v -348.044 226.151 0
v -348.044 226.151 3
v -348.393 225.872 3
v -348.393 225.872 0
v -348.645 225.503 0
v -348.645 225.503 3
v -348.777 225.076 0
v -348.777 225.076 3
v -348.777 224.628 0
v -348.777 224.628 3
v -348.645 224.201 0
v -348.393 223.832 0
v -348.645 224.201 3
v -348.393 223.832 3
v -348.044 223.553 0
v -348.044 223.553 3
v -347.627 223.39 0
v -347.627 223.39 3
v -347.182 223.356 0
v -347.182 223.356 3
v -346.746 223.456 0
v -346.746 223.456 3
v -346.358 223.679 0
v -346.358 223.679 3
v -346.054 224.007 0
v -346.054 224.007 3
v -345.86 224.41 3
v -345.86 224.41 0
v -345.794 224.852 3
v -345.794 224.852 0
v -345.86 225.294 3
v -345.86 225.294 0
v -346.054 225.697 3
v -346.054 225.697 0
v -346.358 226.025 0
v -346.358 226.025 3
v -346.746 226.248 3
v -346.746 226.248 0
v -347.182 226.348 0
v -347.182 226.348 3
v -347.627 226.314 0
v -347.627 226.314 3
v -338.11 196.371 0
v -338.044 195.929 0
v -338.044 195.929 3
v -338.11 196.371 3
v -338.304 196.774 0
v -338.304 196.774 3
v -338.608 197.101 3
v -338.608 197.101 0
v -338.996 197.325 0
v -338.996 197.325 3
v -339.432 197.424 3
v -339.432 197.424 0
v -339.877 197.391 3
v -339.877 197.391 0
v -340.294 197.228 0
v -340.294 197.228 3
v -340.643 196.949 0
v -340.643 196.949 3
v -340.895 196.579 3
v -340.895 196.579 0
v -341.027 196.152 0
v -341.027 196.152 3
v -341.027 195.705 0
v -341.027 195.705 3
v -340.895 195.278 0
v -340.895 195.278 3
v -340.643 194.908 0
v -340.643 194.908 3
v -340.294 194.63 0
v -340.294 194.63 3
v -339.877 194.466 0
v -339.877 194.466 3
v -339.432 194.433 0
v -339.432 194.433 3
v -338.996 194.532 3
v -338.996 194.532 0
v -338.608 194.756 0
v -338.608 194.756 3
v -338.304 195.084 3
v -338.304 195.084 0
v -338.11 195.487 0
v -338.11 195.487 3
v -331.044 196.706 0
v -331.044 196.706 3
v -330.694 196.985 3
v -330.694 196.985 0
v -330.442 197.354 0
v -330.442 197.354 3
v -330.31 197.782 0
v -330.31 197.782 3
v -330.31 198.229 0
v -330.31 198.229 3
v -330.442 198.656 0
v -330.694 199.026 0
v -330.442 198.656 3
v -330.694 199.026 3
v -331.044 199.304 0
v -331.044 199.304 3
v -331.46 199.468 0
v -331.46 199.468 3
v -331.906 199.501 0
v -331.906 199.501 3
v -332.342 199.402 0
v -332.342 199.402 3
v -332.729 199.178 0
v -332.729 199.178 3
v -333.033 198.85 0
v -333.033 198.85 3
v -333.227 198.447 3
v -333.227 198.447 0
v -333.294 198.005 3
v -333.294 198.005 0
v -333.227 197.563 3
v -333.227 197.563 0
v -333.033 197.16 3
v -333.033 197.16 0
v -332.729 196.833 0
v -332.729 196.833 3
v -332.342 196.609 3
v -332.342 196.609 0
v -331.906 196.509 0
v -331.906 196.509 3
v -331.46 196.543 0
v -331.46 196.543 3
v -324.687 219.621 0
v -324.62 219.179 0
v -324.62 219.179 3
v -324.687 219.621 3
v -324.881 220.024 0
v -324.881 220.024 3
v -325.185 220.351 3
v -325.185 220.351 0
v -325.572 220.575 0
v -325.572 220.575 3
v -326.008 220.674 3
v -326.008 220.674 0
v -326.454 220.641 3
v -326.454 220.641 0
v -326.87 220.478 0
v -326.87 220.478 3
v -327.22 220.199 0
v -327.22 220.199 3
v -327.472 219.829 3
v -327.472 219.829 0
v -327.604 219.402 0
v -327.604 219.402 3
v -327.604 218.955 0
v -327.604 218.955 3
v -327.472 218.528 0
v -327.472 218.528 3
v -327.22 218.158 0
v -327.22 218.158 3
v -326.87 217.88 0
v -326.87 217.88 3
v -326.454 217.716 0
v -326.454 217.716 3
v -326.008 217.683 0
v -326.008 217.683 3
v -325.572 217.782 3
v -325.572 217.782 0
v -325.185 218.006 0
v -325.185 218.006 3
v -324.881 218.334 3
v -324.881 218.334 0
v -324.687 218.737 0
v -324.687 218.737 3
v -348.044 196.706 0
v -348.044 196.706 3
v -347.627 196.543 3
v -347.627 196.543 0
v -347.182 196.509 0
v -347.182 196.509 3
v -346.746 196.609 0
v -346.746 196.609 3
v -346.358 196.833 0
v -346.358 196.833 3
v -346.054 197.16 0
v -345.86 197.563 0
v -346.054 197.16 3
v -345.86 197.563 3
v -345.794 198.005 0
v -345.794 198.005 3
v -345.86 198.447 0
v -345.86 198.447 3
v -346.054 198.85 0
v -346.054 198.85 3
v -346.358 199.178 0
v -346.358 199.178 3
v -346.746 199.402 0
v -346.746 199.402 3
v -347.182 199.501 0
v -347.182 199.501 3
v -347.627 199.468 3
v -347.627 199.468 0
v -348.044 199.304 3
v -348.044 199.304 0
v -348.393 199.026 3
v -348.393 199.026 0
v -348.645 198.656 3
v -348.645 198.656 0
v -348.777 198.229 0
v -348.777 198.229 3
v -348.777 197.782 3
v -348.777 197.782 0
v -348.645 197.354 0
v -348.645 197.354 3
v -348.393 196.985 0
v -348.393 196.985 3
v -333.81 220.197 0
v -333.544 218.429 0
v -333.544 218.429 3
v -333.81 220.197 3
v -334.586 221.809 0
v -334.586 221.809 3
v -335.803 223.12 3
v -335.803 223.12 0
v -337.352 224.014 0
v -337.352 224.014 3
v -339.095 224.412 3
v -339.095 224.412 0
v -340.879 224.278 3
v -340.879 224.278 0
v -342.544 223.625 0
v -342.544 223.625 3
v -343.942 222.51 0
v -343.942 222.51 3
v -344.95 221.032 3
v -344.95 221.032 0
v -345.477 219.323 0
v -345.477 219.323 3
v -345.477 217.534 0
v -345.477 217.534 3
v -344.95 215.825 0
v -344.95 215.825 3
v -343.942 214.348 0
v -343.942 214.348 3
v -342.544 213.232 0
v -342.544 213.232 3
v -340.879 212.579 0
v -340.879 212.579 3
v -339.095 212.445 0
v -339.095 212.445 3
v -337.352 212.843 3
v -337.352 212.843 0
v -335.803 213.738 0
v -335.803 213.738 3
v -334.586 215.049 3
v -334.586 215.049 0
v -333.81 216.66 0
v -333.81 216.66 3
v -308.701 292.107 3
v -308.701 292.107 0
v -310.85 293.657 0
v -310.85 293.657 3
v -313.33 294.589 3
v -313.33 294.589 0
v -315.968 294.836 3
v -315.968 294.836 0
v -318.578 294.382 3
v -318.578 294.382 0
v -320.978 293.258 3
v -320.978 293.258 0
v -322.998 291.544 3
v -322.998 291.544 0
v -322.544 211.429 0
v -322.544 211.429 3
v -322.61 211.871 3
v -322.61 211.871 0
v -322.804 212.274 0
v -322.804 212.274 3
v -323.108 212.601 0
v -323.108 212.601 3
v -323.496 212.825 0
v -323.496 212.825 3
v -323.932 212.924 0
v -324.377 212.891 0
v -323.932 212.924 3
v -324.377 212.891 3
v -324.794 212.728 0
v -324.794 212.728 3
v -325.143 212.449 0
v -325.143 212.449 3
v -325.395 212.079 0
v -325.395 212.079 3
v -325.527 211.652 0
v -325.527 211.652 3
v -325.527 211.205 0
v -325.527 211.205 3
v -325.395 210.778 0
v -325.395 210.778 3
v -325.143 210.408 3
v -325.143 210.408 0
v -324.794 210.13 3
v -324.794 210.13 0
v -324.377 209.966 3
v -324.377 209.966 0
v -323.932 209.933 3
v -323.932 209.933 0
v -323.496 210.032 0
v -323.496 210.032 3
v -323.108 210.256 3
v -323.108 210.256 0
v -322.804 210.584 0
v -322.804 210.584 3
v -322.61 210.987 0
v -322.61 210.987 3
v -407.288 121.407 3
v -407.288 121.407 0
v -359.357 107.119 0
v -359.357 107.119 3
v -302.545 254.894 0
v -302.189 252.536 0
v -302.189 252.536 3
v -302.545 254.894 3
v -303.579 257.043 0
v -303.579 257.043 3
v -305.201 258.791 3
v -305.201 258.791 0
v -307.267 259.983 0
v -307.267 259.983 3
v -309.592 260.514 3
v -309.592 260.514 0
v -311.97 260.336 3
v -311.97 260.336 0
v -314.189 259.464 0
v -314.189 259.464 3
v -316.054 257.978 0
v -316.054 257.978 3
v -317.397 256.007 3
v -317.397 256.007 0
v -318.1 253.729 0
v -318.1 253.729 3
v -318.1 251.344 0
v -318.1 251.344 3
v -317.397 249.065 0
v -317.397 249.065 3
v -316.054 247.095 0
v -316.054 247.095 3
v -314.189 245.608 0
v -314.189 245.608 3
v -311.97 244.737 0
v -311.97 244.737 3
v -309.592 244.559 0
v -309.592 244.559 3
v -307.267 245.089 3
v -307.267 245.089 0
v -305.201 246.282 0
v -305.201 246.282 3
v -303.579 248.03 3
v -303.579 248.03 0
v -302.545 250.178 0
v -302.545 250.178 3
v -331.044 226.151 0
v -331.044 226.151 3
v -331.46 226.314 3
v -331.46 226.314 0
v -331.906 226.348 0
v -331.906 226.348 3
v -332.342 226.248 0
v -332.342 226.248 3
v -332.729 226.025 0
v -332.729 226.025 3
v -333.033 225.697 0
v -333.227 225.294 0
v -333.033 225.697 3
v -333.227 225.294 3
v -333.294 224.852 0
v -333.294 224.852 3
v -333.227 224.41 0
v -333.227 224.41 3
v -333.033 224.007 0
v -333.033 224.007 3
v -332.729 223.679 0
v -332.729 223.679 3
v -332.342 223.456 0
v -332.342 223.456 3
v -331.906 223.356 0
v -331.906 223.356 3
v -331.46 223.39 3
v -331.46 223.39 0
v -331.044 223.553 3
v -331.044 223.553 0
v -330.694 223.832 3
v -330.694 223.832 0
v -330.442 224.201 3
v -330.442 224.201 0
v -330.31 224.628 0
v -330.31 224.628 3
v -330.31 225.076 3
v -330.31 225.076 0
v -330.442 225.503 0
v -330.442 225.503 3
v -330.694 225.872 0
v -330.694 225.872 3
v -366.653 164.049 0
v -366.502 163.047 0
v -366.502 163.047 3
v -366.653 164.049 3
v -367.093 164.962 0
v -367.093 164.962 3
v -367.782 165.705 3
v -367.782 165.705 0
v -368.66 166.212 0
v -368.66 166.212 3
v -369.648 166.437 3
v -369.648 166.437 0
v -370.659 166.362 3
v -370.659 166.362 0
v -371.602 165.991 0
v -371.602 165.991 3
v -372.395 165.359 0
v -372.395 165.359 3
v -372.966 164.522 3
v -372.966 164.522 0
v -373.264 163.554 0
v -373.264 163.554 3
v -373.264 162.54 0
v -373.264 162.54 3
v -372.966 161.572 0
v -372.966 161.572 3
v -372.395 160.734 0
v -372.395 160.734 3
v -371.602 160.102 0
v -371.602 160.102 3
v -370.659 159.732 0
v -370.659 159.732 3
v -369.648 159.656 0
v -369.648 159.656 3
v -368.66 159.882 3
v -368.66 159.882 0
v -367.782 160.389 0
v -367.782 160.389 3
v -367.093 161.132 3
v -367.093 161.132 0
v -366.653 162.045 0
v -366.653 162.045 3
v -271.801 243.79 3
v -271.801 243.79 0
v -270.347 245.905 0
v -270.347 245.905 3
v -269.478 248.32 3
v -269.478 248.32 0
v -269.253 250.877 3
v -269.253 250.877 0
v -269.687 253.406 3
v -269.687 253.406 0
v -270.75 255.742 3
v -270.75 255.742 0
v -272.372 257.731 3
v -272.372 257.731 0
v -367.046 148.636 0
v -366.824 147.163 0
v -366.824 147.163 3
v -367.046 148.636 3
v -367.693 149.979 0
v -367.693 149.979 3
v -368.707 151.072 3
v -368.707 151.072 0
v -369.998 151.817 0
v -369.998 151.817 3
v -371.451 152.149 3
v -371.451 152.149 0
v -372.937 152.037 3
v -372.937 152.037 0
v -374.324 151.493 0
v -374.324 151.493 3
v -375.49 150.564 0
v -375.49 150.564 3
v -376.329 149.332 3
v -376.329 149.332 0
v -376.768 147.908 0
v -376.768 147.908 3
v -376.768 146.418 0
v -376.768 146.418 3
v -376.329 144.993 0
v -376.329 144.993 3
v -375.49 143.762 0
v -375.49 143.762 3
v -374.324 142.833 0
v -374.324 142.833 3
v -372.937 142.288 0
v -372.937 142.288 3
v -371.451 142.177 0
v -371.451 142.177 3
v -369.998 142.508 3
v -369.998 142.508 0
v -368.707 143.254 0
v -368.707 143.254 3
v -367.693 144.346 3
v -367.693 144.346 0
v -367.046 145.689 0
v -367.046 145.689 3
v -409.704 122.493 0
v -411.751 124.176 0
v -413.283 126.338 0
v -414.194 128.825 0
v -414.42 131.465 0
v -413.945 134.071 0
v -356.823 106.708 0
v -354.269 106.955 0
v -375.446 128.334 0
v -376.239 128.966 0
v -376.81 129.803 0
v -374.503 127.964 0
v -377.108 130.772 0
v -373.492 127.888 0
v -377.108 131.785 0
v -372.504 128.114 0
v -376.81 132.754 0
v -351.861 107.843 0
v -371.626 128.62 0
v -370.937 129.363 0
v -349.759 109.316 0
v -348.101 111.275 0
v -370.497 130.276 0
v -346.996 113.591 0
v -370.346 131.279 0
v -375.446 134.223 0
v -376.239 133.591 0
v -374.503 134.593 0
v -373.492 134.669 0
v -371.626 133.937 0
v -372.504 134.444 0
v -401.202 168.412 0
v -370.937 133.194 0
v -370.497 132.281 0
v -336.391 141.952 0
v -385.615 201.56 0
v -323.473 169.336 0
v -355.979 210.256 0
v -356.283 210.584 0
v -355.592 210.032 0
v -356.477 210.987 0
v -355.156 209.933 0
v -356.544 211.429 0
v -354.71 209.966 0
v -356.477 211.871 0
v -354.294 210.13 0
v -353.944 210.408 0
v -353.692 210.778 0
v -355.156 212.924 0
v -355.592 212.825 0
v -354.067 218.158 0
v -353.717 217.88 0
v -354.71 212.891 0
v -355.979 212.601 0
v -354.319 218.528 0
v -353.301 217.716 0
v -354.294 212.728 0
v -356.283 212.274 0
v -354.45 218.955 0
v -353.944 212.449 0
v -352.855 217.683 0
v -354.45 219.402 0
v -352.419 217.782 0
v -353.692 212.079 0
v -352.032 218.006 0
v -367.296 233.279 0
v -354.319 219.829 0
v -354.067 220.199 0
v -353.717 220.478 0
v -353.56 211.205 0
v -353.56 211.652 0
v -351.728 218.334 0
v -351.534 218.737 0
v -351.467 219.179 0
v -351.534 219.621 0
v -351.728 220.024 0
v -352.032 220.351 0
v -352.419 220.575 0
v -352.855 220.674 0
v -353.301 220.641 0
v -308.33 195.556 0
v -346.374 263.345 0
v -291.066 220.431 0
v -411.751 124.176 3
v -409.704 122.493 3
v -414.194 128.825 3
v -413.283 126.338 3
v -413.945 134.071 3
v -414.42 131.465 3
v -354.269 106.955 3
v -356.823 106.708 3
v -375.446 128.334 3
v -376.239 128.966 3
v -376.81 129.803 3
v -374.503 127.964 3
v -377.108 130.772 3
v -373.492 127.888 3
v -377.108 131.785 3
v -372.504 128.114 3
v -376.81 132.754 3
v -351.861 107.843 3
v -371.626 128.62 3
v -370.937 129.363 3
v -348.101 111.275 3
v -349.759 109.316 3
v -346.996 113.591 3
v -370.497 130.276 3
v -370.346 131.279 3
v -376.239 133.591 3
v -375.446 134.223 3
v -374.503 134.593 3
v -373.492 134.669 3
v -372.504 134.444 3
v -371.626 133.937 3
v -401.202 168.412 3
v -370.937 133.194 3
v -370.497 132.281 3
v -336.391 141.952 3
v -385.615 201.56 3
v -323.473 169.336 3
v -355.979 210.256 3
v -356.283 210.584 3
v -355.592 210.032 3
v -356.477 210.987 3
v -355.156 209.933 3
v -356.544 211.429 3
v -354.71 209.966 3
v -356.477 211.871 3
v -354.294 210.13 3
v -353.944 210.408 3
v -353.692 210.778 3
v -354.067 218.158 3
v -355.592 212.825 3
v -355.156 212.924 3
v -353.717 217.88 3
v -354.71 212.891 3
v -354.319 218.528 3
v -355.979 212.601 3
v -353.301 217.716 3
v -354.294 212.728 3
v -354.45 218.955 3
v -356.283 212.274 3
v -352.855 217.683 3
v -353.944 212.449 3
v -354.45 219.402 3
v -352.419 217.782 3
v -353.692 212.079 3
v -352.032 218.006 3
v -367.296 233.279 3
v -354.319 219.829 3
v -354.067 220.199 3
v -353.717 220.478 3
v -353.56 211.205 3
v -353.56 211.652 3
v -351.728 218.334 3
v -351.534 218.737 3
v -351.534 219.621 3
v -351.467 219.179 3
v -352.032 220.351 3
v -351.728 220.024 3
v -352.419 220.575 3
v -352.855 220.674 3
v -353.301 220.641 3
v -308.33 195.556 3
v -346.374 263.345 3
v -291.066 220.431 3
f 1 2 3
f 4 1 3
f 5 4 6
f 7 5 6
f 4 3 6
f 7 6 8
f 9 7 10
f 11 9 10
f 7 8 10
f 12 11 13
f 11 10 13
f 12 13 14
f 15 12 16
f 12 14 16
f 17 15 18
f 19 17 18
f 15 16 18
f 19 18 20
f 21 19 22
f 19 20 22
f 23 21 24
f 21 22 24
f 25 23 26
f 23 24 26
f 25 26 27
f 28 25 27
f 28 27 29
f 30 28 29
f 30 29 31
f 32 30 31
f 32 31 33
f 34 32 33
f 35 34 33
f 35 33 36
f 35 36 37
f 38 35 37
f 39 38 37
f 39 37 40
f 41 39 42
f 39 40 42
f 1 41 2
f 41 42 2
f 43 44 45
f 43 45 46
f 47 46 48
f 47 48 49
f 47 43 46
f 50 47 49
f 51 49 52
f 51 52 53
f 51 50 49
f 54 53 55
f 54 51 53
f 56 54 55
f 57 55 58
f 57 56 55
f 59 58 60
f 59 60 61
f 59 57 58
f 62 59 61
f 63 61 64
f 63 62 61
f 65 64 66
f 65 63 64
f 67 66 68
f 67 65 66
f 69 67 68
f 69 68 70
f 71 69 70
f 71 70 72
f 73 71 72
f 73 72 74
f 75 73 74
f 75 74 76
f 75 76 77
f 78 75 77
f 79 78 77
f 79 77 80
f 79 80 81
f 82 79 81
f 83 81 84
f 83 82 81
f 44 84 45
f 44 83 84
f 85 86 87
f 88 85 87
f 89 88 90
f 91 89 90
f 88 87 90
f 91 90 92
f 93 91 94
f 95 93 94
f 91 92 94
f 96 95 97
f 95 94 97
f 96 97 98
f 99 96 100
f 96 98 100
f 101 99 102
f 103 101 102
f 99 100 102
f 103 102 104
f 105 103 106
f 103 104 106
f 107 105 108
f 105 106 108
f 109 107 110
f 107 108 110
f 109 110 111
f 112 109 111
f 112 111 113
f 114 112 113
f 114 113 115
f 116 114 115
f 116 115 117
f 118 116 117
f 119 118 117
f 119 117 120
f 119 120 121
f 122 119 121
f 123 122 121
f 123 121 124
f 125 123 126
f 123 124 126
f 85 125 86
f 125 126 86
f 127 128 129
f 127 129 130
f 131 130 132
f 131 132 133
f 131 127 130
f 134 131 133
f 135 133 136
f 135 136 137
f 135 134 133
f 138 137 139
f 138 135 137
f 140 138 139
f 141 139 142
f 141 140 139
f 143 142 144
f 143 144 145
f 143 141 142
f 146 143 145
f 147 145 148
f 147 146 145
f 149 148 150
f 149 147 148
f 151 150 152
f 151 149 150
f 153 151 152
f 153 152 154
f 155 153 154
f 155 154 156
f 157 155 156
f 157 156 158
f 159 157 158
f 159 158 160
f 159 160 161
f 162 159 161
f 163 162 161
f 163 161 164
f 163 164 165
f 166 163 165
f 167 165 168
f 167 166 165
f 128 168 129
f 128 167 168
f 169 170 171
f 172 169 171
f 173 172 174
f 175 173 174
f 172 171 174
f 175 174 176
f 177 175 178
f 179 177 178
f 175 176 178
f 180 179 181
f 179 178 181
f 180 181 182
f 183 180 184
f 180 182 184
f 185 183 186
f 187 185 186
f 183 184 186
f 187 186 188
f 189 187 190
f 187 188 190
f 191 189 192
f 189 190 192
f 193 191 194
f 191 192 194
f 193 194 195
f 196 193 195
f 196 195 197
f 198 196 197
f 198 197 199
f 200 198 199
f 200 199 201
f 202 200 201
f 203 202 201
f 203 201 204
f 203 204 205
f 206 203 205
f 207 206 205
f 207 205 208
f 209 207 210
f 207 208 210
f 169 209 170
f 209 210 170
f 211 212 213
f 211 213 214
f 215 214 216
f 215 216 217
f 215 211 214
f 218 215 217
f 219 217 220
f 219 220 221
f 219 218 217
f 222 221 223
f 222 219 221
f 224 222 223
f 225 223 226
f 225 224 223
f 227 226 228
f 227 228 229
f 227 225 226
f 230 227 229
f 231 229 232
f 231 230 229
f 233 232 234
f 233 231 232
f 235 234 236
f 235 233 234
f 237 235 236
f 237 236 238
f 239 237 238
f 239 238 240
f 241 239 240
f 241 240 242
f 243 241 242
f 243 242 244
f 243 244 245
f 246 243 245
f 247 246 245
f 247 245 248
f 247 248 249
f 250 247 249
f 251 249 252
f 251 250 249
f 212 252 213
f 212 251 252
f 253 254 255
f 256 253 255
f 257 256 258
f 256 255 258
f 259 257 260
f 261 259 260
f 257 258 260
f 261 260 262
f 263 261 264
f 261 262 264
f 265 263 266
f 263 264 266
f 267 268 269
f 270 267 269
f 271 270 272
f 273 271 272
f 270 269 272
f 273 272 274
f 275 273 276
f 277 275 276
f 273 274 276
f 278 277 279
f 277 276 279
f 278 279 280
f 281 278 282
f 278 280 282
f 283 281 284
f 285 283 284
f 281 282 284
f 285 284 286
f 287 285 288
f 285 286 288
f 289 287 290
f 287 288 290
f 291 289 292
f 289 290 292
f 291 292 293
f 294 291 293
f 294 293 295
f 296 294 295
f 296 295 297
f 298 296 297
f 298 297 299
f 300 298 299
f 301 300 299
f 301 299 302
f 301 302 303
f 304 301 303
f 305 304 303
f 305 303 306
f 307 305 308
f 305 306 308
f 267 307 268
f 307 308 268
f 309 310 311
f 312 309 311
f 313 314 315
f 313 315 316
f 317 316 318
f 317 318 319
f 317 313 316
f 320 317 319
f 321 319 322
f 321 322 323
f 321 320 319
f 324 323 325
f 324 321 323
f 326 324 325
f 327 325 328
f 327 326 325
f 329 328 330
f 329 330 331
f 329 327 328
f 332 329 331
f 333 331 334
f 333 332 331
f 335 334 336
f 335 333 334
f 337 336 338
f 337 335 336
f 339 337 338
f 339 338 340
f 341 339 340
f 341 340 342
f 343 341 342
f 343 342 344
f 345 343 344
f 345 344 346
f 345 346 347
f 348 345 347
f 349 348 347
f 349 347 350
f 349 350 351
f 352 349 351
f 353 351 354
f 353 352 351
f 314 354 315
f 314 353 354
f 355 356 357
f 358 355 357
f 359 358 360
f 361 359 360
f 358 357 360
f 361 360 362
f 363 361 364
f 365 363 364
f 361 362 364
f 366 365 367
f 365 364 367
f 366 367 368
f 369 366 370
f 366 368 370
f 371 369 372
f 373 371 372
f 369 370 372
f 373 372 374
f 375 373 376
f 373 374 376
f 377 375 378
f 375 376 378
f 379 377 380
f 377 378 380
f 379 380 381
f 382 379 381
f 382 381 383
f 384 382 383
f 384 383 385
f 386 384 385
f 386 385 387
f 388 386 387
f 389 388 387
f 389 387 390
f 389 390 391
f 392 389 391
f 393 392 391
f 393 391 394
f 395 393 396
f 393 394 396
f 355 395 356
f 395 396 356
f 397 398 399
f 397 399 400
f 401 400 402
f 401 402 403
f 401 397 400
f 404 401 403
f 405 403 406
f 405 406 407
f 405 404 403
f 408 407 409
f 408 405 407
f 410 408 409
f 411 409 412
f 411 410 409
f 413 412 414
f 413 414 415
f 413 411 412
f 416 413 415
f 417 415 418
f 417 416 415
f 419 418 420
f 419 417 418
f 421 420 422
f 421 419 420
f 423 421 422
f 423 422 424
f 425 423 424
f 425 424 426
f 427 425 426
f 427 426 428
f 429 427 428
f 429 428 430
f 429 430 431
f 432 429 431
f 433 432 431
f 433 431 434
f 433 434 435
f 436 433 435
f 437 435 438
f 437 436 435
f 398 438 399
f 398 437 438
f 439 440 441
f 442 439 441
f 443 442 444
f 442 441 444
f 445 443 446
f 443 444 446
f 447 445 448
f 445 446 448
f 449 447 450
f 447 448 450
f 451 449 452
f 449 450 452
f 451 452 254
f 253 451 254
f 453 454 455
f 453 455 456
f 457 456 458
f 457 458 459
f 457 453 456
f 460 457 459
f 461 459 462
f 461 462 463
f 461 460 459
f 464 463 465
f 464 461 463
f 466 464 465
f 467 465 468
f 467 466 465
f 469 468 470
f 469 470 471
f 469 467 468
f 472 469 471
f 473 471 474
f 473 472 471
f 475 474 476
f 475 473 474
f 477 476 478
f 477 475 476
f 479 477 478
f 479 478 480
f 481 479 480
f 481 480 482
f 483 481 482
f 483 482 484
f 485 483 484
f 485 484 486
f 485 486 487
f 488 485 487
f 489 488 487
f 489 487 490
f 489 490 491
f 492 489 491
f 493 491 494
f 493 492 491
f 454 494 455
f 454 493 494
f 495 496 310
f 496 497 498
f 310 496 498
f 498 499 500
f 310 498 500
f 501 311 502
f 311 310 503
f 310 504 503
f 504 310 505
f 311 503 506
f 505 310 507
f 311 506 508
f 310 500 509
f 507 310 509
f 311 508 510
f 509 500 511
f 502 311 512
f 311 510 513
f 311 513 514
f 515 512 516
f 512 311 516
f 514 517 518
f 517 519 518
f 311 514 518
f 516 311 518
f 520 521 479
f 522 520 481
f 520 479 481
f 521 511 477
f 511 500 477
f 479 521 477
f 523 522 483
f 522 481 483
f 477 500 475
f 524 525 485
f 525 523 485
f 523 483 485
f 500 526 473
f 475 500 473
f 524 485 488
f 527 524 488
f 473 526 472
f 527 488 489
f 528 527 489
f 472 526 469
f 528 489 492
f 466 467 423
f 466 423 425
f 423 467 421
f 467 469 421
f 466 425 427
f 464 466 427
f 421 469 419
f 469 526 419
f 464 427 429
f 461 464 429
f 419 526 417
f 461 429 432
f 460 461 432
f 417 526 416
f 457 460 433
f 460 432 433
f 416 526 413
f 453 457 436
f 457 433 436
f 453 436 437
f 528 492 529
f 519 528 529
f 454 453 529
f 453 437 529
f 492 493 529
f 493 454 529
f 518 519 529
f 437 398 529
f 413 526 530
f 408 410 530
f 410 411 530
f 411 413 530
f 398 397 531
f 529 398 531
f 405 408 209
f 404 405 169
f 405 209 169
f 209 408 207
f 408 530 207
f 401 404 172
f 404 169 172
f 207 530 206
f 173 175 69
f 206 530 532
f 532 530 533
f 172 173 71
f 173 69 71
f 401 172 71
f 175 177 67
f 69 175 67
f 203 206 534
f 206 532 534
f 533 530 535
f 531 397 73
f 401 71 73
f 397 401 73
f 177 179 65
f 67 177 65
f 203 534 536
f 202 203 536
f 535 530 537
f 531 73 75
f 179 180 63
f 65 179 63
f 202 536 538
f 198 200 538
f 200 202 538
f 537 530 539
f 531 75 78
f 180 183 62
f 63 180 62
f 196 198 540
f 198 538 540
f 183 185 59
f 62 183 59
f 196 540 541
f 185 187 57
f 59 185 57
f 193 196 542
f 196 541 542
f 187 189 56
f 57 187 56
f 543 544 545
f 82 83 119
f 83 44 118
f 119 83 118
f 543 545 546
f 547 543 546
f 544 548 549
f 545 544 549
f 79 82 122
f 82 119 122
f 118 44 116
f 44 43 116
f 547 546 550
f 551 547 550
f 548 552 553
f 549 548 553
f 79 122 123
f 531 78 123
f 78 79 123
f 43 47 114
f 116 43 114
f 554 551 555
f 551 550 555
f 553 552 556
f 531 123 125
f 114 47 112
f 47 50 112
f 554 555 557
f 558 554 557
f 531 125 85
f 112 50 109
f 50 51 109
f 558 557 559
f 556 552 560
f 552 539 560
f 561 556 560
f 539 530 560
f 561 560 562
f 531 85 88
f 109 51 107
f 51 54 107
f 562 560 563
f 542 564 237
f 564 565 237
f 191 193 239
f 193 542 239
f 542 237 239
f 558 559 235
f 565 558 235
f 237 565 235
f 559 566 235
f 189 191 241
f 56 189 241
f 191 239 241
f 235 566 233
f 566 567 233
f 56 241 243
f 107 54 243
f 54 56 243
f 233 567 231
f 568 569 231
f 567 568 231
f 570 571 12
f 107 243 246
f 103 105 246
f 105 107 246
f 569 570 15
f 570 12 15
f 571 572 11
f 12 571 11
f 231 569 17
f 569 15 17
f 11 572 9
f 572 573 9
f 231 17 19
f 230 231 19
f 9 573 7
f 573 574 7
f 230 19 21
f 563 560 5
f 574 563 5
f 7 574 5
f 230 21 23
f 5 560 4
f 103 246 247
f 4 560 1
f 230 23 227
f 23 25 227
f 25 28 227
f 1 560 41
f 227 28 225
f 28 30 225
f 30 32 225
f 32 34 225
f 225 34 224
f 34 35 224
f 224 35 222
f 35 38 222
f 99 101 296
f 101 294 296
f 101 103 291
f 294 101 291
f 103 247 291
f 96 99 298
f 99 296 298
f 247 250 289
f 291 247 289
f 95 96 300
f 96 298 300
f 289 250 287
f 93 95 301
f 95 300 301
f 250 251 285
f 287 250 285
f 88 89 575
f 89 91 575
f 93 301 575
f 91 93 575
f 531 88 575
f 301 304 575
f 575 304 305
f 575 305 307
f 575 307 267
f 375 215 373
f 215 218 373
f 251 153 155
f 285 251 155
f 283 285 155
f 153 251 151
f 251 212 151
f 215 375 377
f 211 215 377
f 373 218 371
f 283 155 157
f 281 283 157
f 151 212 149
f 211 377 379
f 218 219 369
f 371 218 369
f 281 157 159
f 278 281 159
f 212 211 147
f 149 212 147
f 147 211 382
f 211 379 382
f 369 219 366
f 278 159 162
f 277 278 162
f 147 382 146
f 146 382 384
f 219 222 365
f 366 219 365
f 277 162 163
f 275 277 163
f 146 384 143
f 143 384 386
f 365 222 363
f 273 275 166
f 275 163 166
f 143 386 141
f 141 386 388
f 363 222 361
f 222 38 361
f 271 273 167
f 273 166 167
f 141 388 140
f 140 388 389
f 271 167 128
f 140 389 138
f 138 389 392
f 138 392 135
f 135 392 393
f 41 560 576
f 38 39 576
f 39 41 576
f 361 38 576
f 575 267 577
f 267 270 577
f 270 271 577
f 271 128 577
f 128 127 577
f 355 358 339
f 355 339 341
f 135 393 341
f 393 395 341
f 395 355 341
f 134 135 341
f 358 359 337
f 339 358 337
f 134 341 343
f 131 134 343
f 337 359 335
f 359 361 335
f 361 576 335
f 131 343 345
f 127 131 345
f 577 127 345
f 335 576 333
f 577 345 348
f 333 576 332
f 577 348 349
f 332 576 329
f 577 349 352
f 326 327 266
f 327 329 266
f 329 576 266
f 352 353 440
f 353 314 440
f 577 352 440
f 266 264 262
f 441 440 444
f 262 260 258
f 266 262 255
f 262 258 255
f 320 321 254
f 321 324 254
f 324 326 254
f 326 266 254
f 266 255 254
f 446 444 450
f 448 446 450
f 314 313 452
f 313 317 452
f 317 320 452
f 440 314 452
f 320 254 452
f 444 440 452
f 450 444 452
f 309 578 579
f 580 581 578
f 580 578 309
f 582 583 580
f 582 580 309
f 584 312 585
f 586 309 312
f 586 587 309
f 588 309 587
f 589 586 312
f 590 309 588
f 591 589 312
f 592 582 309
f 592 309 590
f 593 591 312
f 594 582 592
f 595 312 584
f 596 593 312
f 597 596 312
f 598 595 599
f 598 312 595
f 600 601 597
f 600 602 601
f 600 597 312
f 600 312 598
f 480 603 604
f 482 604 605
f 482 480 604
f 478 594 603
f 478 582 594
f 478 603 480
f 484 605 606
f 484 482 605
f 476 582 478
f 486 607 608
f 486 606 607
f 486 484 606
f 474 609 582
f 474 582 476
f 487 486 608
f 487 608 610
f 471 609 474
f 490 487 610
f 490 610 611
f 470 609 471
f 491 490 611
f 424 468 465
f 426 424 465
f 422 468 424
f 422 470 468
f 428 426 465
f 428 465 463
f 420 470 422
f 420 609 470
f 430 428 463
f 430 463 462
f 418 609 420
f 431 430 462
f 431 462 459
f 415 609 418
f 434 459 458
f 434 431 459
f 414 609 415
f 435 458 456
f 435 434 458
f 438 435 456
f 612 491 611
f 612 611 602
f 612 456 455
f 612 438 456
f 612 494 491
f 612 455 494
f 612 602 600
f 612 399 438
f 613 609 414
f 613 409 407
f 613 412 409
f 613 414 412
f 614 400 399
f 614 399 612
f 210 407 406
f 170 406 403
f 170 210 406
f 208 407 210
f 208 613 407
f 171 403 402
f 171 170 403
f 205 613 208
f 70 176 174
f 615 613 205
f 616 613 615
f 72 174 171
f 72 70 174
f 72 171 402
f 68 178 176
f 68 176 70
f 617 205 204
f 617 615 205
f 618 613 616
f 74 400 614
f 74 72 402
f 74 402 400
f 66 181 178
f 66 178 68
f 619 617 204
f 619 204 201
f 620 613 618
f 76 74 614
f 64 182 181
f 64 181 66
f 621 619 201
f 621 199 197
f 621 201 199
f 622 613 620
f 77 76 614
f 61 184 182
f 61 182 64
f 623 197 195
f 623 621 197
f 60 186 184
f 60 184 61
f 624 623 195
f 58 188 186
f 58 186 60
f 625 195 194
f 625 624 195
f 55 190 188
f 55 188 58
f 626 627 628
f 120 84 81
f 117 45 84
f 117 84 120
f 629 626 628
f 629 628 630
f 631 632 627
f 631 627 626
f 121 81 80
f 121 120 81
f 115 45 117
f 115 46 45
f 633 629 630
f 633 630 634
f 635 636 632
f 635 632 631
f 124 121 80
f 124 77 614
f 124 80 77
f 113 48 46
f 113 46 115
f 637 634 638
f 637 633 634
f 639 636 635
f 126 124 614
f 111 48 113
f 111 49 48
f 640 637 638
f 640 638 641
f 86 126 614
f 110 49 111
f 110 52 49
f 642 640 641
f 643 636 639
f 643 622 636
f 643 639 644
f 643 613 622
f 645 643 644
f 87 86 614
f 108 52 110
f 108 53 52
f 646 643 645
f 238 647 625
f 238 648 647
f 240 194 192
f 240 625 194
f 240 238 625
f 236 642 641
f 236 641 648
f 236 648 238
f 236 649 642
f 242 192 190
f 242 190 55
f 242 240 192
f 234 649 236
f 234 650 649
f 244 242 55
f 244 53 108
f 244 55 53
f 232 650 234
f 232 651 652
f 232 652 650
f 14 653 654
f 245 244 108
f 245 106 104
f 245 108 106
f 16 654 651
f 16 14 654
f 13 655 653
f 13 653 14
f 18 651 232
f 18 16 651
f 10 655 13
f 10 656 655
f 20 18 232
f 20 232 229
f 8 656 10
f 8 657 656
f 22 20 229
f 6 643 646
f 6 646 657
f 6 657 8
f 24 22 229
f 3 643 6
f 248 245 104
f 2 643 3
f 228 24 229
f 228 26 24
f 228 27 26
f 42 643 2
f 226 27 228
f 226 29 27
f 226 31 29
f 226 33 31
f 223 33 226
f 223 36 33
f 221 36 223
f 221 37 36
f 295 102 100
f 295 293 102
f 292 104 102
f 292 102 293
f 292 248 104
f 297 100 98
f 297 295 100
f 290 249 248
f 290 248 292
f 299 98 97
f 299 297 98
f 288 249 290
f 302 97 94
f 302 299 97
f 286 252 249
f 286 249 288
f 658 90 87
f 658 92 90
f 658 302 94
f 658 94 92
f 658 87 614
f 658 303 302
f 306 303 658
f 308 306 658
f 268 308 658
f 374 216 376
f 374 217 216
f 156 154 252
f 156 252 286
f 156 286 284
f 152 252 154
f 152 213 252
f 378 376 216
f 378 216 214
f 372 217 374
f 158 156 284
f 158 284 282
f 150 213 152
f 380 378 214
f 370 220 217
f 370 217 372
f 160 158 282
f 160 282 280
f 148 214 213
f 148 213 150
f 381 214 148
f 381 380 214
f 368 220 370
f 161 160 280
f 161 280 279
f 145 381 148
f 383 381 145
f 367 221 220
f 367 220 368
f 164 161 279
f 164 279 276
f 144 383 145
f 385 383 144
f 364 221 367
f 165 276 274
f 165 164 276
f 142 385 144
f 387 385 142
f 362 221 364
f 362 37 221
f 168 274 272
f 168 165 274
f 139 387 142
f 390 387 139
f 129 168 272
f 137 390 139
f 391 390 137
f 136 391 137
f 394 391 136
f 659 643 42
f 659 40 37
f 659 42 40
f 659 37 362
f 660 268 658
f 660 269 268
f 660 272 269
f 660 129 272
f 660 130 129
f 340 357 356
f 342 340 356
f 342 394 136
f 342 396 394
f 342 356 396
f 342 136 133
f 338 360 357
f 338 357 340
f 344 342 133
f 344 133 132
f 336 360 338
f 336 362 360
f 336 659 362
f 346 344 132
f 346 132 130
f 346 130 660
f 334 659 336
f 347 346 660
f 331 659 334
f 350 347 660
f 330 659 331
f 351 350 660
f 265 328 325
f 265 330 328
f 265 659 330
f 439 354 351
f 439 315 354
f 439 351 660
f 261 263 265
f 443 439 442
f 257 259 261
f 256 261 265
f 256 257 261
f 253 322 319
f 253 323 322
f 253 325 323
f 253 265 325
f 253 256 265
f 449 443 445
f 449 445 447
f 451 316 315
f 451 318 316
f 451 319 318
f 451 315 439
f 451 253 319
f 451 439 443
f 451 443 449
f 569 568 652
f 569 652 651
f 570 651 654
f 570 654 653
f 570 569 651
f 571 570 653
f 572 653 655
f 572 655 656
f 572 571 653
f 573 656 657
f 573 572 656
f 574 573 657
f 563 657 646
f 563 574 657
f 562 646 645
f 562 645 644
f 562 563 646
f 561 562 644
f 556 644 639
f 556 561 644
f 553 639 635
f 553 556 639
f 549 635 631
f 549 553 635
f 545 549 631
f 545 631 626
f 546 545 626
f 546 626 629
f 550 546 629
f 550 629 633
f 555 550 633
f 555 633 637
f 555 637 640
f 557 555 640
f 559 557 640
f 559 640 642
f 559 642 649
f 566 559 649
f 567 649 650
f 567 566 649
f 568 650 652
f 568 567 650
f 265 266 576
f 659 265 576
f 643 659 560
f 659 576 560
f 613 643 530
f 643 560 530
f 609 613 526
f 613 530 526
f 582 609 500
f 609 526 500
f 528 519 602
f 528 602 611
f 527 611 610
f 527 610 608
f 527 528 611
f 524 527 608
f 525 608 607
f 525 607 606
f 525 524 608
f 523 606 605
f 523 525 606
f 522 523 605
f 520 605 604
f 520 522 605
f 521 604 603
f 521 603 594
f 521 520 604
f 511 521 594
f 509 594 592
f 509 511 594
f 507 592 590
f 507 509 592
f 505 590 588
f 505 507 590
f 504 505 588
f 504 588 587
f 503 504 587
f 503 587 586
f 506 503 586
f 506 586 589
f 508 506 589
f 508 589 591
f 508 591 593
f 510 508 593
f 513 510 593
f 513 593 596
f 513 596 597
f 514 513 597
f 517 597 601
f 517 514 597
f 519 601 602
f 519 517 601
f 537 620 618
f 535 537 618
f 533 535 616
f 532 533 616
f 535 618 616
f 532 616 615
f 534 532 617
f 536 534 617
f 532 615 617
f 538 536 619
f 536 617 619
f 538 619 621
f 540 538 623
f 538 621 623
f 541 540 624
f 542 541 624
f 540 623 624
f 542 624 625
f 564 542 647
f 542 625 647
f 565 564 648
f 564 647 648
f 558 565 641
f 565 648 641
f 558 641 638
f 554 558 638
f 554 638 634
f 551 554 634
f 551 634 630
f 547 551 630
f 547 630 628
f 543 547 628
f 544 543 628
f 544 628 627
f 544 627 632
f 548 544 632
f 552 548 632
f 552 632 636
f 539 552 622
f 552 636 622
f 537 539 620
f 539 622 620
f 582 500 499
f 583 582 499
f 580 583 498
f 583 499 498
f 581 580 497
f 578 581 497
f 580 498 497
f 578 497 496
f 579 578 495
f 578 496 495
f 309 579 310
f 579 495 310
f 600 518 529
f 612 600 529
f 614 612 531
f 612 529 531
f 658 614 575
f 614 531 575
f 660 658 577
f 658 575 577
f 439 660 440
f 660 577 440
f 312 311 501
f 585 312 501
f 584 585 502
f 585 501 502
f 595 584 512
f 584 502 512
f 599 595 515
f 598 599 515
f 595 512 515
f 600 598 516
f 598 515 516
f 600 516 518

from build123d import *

# Parameters (mm, degrees)
SKETCH1_R           = 3.4
SKETCH1_R_2         = 5
SKETCH1_R_3         = 8
SKETCH1_R_4         = 1.5
SKETCH1_R_5         = 6
BOSS_EXTRUDE1_DEPTH = 3
SKETCH4_R           = 1.5
CUT_EXTRUDE1_DEPTH  = 3
CIRPATTERN1_COUNT   = 6


with BuildPart() as part:
    # Sketch1 → Boss-Extrude1 (new body)
    with BuildSketch(Plane.XY):
        with BuildLine():
            ThreePointArc((-271.800817077, 243.790124811), (-269.253440252, 250.876511464), (-272.371911597, 257.730790488))
            Line((-272.371911597, 257.730790488), (-308.701287129, 292.107311249))
            ThreePointArc((-308.701287129, 292.107311249), (-315.968083296, 294.835963731), (-322.997699137, 291.544099213))
            ThreePointArc((-322.997699137, 291.544099213), (-376.789694918, 217.612042952), (-413.944817586, 134.07148626))
            ThreePointArc((-413.944817586, 134.07148626), (-413.283077207, 126.337537039), (-407.288017737, 121.406904946))
            Line((-407.288017737, 121.406904946), (-359.356506069, 107.119186605))
            ThreePointArc((-359.356506069, 107.119186605), (-351.861081548, 107.843490223), (-346.996122098, 113.591374532))
            ThreePointArc((-346.996122098, 113.591374532), (-316.172961568, 182.603306357), (-271.800817077, 243.790124811))
        make_face()
        with Locations((-373.746213466, 131.27857223)):
            Circle(SKETCH1_R, mode=Mode.SUBTRACT)
        with Locations((-371.824242114, 147.162716089)):
            Circle(SKETCH1_R_2, mode=Mode.SUBTRACT)
        with Locations((-369.902270762, 163.046859947)):
            Circle(SKETCH1_R, mode=Mode.SUBTRACT)
        with Locations((-310.189407893, 252.536198061)):
            Circle(SKETCH1_R_3, mode=Mode.SUBTRACT)
        with Locations((-326.120312176, 219.178644843)):
            Circle(SKETCH1_R_4, mode=Mode.SUBTRACT)
        with Locations((-339.543705934, 195.928644843)):
            Circle(SKETCH1_R_4, mode=Mode.SUBTRACT)
        with Locations((-352.967099693, 219.178644843)):
            Circle(SKETCH1_R_4, mode=Mode.SUBTRACT)
        with Locations((-339.543705934, 218.428644843)):
            Circle(SKETCH1_R_5, mode=Mode.SUBTRACT)
    extrude(amount=BOSS_EXTRUDE1_DEPTH)

    # Sketch4 → Cut-Extrude1 (cut)
    with BuildSketch(Plane.XY.offset(3)):
        with Locations((-324.043705934, 211.428644843)):
            Circle(SKETCH4_R)
    cut_extrude1 = extrude(amount=-CUT_EXTRUDE1_DEPTH, mode=Mode.SUBTRACT)

    # CirPattern1: Cut-Extrude1 ×6 about axis
    cirpattern1_axis = Axis((-339.543705934, 211.428644843, 0), (0, 0, 1))
    for i in range(1, CIRPATTERN1_COUNT):
        add(cut_extrude1.rotate(cirpattern1_axis, i * 360 / CIRPATTERN1_COUNT), mode=Mode.SUBTRACT)


solid = part.part
